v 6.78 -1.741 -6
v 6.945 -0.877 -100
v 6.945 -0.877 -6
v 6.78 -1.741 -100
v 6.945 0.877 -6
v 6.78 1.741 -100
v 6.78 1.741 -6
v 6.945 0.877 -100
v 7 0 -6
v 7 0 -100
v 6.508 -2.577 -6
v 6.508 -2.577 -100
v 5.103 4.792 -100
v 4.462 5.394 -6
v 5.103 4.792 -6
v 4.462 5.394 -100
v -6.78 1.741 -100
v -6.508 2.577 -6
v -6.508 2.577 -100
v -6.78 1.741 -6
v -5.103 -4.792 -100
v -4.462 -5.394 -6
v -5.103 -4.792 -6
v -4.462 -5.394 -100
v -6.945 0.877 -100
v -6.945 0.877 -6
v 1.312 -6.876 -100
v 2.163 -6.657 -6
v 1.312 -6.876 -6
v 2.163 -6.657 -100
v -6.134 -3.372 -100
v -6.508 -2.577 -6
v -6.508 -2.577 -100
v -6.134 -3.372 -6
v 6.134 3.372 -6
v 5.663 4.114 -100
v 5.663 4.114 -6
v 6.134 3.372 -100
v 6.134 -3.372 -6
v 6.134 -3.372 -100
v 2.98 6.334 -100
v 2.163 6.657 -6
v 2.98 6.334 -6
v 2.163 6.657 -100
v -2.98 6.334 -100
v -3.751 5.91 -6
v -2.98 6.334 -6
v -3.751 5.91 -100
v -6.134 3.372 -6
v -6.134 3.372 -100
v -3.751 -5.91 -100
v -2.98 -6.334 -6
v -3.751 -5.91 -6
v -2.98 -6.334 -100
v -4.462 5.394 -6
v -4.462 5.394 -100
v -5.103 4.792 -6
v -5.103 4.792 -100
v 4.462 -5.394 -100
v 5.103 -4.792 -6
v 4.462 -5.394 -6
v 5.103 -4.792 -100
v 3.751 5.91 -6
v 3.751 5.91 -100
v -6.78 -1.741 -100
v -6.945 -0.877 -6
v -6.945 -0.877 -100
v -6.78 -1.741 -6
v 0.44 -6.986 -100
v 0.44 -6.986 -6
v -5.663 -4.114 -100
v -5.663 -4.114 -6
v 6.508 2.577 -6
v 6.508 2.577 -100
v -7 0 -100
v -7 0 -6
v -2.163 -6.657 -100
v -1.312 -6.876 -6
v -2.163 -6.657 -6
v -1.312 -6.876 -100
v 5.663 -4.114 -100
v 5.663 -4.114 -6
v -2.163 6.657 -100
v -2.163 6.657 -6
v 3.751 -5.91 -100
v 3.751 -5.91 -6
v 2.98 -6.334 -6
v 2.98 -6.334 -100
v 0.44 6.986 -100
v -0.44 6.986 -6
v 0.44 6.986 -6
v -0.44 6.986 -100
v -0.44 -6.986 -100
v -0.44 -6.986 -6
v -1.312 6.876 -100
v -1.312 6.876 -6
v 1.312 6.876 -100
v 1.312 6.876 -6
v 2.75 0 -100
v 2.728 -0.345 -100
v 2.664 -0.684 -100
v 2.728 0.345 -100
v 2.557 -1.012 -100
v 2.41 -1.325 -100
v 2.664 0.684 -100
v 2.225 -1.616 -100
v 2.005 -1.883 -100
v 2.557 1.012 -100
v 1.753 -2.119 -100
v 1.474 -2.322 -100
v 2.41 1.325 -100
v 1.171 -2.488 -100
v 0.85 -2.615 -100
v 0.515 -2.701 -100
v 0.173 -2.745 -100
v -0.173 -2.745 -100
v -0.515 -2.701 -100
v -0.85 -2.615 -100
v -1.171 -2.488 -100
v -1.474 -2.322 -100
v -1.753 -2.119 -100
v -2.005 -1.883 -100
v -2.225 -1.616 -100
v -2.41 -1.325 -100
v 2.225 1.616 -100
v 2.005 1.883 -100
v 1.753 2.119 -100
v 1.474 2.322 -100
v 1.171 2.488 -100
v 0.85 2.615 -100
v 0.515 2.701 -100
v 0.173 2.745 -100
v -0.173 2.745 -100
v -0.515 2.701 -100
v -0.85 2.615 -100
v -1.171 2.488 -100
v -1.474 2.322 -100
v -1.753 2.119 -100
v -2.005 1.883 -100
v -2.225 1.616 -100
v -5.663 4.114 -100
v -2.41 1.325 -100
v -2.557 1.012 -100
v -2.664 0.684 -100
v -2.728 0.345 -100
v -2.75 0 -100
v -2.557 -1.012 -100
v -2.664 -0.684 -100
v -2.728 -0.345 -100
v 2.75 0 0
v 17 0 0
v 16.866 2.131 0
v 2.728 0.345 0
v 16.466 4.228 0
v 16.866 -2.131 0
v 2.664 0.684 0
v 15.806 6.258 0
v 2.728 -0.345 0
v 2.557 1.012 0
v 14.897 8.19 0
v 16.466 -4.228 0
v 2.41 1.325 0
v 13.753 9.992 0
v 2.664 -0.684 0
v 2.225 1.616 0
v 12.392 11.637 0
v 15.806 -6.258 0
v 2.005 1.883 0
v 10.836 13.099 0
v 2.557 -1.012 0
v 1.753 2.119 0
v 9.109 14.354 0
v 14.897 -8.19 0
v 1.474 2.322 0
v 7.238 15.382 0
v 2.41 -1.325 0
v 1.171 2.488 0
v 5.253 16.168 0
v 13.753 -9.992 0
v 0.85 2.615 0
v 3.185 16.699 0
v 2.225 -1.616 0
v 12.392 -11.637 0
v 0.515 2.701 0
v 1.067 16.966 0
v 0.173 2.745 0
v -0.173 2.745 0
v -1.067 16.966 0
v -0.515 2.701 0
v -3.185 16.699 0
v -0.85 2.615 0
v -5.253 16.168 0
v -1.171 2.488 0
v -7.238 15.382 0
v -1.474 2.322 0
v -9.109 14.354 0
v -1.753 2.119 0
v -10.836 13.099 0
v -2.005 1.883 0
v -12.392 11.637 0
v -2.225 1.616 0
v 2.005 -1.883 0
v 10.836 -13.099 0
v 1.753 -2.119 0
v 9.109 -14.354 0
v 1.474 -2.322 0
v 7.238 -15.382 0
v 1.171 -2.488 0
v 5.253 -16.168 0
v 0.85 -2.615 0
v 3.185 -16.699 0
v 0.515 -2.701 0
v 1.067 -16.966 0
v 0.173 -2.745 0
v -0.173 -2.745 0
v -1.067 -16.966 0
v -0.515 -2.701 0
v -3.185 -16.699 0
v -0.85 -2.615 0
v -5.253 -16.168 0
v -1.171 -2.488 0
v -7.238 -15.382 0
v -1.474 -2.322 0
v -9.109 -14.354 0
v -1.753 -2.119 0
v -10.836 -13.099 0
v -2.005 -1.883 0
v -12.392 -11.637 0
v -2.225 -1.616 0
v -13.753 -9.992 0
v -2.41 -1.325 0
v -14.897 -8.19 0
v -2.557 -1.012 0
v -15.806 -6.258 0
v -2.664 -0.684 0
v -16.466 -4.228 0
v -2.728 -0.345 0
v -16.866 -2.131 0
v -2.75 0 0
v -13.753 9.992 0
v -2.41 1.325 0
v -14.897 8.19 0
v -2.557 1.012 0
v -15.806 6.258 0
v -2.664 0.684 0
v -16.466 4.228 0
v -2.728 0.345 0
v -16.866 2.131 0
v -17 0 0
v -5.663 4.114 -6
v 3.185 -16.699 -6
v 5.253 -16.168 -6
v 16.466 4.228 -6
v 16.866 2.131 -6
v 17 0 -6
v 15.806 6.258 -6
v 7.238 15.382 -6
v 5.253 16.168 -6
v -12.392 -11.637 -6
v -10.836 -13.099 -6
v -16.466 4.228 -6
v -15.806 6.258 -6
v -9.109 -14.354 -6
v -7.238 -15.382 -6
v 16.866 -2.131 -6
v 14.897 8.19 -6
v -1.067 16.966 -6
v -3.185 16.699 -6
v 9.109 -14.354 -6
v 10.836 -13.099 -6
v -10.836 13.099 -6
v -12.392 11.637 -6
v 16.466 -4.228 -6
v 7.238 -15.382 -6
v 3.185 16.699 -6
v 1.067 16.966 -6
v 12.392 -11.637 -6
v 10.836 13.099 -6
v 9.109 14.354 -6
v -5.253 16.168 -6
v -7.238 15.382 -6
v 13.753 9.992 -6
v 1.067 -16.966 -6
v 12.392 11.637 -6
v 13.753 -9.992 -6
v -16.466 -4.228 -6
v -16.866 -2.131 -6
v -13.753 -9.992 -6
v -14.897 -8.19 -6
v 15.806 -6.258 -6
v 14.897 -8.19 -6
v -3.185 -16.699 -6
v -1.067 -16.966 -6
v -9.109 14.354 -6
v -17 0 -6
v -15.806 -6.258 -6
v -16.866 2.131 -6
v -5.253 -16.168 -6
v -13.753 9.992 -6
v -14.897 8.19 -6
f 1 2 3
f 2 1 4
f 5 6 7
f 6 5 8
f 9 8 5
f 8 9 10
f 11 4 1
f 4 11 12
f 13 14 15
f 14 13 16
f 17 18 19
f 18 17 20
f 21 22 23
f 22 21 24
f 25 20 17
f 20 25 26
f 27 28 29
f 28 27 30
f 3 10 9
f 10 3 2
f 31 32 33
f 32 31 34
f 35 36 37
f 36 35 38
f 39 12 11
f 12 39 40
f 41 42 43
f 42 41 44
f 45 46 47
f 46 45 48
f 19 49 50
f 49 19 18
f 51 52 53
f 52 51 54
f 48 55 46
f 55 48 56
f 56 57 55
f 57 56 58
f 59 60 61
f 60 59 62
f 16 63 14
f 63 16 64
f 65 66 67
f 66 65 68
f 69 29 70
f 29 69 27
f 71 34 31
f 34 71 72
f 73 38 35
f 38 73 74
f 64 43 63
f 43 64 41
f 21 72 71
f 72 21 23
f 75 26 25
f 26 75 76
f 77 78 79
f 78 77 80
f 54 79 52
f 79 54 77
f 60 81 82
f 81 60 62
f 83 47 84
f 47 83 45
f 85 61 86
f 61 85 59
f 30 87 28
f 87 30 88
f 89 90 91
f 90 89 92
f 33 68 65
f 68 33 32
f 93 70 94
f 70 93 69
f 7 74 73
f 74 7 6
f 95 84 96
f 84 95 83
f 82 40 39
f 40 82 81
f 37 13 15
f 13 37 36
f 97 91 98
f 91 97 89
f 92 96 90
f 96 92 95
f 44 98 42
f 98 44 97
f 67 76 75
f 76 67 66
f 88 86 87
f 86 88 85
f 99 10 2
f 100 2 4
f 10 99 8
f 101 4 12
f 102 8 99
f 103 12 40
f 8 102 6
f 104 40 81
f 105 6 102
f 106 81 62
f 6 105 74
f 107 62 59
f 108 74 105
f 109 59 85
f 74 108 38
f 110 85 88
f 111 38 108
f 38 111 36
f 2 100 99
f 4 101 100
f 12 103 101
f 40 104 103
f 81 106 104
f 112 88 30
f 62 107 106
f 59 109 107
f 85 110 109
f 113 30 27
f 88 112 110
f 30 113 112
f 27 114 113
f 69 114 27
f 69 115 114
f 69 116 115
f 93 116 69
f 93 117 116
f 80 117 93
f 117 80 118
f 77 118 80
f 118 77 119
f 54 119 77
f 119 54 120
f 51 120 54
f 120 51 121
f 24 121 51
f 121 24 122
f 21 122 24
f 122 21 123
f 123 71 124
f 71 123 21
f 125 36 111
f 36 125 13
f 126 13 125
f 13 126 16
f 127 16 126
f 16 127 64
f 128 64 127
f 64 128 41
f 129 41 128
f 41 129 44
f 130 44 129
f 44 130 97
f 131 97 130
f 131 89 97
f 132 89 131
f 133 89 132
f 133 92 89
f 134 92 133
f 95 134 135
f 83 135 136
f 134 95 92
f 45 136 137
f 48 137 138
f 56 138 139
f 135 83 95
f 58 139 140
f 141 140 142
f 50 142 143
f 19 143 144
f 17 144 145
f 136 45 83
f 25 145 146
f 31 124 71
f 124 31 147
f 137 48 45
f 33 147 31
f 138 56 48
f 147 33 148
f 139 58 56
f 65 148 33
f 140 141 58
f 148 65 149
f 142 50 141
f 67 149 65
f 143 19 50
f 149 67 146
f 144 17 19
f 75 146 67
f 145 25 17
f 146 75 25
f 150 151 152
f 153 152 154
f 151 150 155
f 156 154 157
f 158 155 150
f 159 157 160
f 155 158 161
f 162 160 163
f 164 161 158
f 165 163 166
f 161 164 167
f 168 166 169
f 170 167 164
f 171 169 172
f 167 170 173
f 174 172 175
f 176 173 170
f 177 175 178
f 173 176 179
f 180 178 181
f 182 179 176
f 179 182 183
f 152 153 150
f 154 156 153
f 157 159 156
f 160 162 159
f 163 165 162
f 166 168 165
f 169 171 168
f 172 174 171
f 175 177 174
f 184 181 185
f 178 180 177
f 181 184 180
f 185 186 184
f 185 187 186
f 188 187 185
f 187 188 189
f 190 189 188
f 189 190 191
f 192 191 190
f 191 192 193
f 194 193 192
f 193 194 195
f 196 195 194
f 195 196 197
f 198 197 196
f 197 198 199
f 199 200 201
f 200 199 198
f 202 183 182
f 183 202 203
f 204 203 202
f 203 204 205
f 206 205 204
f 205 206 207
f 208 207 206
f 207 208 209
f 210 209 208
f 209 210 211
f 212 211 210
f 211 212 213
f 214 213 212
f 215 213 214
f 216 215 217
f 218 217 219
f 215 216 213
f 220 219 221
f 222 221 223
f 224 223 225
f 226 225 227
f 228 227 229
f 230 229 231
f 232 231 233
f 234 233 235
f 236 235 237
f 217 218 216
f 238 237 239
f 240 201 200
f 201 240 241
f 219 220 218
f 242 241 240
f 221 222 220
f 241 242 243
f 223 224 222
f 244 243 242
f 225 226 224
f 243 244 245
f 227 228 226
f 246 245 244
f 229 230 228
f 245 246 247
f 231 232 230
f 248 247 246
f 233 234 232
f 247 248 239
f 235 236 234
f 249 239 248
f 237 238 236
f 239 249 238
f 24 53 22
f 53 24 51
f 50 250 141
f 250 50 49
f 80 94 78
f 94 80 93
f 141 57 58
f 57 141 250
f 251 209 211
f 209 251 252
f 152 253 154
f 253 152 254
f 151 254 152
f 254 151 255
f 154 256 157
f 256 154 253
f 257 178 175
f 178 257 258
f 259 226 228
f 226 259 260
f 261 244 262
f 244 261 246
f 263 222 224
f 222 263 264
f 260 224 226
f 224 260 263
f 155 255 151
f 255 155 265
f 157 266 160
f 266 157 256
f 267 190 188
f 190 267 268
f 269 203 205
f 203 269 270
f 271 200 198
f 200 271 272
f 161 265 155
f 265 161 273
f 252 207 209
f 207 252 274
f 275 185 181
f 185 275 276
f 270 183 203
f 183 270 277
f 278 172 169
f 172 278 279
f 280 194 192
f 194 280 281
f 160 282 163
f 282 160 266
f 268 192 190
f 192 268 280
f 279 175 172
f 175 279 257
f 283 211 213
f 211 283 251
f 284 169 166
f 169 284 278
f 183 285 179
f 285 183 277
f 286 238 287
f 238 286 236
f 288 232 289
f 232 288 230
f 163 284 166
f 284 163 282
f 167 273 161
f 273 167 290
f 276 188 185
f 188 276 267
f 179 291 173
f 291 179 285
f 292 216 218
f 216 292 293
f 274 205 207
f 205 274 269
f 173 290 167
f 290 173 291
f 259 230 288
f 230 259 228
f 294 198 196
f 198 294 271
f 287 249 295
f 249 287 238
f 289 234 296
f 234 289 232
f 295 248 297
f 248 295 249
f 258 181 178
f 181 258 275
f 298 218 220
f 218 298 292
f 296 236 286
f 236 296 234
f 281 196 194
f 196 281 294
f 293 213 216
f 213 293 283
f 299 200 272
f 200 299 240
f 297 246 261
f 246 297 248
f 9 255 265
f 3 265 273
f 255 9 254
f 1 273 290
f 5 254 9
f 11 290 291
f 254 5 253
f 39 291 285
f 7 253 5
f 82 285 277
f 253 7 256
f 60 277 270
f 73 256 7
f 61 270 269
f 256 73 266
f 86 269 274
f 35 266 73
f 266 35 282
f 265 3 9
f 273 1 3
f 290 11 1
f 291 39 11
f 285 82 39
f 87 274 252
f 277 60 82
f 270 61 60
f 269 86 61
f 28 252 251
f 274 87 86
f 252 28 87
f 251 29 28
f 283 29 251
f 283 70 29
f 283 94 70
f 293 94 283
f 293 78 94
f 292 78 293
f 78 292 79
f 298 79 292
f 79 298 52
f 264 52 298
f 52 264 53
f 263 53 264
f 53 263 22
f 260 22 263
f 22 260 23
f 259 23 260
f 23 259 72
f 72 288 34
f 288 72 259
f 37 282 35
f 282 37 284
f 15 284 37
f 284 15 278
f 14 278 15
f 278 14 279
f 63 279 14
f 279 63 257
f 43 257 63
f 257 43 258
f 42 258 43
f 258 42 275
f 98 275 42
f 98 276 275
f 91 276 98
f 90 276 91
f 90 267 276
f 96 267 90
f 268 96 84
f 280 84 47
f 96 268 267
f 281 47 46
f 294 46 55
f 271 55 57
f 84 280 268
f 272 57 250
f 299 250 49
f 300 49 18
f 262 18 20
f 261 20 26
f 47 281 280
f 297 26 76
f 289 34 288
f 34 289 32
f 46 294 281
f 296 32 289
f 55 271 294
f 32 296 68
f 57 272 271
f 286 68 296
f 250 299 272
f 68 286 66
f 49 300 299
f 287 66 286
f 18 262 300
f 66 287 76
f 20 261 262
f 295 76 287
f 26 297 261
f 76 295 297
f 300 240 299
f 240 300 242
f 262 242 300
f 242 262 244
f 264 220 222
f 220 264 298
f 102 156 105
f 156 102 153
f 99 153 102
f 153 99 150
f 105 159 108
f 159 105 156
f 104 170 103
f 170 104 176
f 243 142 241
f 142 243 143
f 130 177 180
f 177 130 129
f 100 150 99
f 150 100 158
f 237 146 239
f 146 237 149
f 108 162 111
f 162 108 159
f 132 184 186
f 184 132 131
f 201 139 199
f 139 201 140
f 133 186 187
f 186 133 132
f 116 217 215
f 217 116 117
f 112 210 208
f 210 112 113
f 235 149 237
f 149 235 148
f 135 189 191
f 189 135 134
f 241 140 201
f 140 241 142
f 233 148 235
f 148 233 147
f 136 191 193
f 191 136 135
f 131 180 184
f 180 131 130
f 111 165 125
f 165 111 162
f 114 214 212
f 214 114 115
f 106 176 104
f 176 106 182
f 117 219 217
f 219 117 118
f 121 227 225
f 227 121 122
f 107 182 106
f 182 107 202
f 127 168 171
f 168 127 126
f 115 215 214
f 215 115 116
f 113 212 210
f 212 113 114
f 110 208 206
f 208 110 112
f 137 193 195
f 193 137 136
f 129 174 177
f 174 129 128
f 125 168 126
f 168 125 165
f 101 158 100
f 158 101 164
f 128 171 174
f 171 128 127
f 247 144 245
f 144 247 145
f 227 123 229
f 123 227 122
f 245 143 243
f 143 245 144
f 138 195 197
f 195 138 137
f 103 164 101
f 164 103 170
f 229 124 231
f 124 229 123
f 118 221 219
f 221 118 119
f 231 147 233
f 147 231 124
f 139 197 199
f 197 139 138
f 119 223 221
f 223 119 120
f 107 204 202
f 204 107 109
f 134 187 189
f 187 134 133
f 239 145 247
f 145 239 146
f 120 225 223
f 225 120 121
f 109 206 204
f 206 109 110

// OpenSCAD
$fn = 50;


difference() {
	union() {
		translate(v = [0, 0, -100.0000000000]) {
			cylinder(h = 100, r = 7.0000000000);
		}
		translate(v = [0, 0, -6.0000000000]) {
			cylinder(h = 6, r = 17.0000000000);
		}
	}
	union() {
		#translate(v = [0, 0, -100]) {
			cylinder(h = 100, r = 2.7500000000);
		}
	}
}
